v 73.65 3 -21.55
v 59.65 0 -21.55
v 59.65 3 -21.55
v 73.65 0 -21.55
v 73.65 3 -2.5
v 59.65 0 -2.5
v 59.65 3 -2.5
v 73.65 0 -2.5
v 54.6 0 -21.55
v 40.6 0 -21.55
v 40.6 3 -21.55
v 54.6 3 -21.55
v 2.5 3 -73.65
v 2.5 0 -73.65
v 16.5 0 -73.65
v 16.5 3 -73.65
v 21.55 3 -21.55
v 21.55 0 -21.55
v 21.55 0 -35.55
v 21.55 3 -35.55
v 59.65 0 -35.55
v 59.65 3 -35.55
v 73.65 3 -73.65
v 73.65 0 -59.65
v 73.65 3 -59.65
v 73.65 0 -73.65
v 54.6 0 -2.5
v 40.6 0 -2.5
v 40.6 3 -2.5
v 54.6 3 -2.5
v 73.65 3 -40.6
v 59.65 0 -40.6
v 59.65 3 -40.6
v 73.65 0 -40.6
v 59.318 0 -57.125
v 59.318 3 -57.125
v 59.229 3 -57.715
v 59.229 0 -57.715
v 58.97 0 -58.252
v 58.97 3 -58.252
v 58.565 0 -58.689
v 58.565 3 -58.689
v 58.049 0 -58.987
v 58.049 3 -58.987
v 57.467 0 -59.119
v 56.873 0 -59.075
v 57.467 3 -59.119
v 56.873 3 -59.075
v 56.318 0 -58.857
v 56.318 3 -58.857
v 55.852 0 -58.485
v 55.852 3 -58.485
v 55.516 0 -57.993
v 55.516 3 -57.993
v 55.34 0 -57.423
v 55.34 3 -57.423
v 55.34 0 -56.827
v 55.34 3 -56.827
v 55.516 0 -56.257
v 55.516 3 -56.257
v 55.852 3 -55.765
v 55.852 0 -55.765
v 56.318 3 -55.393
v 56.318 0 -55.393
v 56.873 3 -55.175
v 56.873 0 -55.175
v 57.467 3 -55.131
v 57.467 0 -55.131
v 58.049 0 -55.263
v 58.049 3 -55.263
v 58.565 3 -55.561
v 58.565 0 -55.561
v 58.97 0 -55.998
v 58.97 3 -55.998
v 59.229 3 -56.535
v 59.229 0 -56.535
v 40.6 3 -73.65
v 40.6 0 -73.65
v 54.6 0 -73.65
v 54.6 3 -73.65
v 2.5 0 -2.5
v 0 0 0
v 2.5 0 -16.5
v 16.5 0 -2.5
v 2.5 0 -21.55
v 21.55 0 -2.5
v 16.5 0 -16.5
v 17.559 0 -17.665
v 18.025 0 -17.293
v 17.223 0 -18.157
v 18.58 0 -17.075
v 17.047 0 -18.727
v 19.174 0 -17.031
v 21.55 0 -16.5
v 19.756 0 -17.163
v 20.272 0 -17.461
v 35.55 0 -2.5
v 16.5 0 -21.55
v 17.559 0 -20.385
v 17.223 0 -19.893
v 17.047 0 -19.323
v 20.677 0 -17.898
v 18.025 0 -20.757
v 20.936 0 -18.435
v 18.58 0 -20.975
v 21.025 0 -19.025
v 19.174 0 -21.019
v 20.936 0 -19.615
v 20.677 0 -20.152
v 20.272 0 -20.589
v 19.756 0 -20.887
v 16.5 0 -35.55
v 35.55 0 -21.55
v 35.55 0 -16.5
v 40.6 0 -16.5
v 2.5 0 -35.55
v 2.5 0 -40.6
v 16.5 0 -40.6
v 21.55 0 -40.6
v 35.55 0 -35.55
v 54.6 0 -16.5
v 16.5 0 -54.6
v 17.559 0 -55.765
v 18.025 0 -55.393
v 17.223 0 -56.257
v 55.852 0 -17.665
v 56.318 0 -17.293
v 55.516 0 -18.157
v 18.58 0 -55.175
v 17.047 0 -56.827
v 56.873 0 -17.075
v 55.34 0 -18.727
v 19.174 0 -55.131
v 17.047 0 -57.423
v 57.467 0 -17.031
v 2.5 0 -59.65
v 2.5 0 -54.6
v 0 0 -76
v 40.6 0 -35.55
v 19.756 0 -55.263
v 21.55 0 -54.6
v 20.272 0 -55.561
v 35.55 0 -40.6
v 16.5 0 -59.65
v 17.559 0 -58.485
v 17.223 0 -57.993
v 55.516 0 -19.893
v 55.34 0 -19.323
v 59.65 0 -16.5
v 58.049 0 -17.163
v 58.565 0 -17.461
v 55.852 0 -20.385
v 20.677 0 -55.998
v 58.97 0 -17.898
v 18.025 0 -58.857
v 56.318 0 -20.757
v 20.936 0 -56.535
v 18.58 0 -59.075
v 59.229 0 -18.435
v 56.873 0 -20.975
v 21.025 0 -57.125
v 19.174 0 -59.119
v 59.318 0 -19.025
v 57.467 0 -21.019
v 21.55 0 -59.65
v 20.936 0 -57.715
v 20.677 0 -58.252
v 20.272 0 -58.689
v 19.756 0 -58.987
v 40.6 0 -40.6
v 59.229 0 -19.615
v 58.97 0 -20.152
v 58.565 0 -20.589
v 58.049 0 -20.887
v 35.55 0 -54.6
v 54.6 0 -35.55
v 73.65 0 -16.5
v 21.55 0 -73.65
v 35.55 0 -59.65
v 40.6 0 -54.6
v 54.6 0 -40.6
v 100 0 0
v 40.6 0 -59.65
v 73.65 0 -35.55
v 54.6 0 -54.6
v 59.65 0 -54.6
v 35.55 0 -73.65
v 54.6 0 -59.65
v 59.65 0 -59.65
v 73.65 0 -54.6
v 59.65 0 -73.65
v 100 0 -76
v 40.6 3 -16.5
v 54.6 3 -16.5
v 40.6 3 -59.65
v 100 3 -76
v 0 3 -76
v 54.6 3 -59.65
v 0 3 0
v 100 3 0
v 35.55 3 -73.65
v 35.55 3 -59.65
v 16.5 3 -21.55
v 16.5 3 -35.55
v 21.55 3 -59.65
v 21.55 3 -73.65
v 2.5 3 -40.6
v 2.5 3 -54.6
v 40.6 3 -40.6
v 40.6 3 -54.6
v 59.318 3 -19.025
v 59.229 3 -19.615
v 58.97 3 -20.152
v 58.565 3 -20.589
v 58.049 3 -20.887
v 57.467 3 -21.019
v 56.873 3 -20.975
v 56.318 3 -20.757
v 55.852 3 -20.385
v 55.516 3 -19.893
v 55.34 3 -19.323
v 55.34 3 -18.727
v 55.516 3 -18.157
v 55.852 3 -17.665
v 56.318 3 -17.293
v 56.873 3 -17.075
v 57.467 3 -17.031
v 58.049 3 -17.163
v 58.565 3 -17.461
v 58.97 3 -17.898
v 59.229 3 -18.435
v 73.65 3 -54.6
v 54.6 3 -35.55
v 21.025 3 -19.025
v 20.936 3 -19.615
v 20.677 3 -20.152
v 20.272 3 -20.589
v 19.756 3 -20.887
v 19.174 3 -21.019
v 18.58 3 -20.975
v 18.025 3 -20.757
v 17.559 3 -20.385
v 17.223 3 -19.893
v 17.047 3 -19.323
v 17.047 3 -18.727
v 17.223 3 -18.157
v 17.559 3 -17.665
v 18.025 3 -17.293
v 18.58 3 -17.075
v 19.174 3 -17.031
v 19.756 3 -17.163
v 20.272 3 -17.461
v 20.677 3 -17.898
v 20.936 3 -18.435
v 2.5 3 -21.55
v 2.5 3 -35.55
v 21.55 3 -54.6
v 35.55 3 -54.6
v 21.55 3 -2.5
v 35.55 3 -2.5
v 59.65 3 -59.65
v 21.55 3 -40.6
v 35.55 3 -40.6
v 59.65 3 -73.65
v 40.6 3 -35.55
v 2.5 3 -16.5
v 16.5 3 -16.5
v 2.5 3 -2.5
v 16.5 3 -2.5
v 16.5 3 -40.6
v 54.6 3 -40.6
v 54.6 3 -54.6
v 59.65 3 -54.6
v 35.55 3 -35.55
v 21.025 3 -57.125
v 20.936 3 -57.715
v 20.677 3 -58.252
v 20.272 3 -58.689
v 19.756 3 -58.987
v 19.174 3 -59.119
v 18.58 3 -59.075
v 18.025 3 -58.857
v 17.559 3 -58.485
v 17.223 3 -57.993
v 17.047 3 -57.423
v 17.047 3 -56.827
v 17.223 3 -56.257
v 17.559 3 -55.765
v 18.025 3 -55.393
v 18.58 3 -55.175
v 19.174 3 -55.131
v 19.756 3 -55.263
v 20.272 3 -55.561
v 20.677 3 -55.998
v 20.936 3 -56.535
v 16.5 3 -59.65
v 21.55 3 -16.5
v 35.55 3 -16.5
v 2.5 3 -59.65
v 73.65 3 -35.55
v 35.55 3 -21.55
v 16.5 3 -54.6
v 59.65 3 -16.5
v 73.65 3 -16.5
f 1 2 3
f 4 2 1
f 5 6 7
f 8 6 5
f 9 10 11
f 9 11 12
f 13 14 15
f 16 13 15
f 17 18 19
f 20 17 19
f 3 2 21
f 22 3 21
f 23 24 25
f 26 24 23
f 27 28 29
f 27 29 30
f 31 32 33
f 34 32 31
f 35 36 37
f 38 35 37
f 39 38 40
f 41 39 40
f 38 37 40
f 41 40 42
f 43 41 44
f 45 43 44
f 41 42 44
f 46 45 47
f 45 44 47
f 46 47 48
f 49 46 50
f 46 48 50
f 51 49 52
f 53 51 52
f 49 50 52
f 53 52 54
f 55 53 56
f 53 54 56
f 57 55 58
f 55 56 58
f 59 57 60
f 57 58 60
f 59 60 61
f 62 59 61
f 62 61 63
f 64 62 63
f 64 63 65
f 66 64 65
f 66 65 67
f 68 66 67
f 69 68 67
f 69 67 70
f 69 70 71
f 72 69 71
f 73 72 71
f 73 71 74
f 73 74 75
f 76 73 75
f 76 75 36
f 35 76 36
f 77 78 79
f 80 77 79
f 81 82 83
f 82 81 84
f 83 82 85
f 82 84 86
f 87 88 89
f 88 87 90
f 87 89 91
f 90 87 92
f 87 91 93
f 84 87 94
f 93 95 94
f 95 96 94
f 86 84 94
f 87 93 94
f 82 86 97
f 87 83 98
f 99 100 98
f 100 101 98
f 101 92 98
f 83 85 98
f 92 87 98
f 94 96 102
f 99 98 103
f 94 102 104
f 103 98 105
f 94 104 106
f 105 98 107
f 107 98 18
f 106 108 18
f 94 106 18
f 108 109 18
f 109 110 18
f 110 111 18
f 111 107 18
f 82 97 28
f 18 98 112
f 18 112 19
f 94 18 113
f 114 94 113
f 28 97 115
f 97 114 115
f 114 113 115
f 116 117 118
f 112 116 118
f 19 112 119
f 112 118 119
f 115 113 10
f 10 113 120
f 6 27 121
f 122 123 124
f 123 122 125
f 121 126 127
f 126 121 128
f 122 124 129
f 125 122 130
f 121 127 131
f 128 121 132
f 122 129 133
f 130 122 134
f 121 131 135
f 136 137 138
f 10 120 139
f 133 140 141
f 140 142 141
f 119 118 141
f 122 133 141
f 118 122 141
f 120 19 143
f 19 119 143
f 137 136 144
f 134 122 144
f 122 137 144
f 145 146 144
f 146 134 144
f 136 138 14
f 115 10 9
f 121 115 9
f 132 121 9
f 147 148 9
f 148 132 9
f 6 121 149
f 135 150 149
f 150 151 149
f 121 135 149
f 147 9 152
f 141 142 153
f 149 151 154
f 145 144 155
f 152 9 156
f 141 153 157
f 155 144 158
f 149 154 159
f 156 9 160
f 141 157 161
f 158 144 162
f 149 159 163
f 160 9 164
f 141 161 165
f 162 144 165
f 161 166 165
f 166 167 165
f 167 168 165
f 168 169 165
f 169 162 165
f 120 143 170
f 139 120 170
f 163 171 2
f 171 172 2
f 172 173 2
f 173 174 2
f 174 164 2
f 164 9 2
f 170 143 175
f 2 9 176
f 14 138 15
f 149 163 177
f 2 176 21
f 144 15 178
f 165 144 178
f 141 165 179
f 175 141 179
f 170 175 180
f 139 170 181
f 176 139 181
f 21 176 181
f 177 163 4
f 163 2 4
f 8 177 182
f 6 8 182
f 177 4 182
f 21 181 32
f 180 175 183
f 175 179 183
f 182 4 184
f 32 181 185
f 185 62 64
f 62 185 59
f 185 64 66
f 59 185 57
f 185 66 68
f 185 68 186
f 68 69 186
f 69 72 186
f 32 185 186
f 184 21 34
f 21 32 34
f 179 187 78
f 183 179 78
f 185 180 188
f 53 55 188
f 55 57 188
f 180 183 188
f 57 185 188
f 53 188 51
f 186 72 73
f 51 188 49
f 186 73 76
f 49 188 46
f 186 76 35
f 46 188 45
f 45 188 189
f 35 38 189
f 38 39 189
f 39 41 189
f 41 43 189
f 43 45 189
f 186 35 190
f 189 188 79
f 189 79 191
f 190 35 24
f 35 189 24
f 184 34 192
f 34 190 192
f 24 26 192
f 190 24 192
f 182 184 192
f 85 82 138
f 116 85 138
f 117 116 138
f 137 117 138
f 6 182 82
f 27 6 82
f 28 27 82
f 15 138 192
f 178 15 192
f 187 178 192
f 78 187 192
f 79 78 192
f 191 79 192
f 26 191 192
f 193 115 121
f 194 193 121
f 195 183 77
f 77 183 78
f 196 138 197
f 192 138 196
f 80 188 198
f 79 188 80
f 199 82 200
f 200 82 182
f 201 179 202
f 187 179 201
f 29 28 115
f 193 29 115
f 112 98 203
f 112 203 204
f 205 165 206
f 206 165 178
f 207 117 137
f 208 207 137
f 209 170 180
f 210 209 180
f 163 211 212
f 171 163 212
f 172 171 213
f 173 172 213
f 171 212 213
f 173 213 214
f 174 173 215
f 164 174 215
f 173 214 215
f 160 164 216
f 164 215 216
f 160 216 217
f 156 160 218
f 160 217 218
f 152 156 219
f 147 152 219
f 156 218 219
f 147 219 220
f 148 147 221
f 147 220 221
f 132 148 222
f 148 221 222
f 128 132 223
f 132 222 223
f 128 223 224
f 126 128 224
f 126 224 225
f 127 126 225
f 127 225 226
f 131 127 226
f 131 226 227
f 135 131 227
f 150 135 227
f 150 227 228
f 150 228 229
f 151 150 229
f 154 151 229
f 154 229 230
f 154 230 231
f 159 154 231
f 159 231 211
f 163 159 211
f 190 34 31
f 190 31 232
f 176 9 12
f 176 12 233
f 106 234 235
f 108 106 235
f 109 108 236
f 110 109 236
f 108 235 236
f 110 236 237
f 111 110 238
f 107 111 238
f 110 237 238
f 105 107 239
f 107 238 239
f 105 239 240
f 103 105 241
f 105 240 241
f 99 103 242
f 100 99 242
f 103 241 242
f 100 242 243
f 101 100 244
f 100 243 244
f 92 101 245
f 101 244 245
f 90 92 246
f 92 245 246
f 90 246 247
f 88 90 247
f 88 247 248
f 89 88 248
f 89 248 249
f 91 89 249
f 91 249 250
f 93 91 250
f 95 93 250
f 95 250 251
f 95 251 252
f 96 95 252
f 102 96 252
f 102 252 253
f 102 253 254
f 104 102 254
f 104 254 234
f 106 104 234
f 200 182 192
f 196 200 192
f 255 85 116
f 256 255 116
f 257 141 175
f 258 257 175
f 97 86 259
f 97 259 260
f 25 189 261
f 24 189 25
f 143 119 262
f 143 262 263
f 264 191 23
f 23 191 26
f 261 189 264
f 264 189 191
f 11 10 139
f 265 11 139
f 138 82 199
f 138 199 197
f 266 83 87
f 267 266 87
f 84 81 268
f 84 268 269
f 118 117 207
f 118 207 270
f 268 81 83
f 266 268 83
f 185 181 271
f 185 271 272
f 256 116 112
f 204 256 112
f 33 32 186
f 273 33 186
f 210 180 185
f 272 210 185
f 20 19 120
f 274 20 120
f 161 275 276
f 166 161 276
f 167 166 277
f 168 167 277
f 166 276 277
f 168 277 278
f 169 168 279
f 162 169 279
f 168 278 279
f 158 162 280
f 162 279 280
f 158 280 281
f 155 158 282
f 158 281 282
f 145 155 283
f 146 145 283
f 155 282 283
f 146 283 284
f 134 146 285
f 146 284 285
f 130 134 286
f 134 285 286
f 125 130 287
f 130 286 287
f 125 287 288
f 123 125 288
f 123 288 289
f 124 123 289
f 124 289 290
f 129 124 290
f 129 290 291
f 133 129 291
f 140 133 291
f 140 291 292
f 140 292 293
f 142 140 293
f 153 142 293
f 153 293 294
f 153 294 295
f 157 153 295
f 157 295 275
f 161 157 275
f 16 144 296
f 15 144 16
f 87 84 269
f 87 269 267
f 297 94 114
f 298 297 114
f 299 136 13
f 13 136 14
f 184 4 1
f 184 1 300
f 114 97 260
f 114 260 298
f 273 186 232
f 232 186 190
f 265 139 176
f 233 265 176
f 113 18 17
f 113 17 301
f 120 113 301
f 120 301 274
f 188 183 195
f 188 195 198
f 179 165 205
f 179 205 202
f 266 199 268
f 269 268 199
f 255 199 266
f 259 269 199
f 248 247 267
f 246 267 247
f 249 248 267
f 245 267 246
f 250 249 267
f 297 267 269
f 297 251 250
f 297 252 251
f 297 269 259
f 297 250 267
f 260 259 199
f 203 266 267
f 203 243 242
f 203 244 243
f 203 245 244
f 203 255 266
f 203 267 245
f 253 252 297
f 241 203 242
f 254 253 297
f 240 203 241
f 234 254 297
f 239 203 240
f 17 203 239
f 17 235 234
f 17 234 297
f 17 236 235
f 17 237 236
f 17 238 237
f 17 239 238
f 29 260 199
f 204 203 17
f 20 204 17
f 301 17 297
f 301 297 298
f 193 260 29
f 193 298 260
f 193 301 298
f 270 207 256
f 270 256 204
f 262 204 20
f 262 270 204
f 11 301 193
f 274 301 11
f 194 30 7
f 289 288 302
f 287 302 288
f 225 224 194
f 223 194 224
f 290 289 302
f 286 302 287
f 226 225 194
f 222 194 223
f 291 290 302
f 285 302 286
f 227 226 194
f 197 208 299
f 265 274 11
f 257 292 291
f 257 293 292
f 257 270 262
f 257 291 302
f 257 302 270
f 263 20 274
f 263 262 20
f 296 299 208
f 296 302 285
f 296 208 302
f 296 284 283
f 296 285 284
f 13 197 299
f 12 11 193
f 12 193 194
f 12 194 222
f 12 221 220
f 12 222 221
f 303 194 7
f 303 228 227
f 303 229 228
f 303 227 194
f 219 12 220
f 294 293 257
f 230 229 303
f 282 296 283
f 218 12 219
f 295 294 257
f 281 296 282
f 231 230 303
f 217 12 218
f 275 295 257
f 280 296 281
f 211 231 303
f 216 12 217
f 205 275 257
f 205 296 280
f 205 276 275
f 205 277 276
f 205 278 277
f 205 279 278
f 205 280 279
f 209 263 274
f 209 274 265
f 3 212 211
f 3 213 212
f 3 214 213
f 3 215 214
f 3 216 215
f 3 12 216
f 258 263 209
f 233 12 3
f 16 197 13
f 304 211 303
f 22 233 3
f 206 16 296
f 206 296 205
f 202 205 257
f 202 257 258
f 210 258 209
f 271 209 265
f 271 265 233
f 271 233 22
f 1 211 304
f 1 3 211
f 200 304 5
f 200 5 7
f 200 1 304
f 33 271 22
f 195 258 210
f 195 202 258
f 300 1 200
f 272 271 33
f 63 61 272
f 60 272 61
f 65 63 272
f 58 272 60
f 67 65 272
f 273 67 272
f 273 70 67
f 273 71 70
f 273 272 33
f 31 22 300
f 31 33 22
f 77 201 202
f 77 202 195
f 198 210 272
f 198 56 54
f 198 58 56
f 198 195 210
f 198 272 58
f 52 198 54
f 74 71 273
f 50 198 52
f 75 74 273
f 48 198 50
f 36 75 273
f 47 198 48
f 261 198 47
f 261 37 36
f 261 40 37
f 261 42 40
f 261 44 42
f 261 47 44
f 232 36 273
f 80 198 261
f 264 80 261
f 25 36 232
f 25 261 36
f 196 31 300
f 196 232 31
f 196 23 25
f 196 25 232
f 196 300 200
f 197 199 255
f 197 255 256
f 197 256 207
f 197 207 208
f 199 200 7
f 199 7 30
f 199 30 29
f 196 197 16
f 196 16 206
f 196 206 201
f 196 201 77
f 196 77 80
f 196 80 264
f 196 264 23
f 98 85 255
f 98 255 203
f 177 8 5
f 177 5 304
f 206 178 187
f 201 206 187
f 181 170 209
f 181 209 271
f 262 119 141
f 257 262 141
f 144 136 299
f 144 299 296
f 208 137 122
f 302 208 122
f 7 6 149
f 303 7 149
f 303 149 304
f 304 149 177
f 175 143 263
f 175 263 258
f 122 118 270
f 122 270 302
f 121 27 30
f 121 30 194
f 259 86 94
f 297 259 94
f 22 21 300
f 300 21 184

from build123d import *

# Parameters (mm, degrees)
SKETCH1_W               = 100
SKETCH1_H               = 76
BOSS_EXTRUDE1_DEPTH     = 3
CUT_EXTRUDE1_START      = -4
SKETCH2_W               = 14
SKETCH2_H               = 14
CUT_EXTRUDE1_DEPTH      = 5
LPATTERN1_COUNT         = 4
LPATTERN1_PITCH         = 19.05
LPATTERN1_COUNT_DIR2    = 4
LPATTERN1_PITCH_DIR2    = 19.05
SKETCH4_R               = 2
CUT_EXTRUDE2_DEPTH      = 1
CUT_EXTRUDE2_DEPTH_BACK = 4


with BuildPart() as part:
    # Sketch1 → Boss-Extrude1 (new body)
    with BuildSketch(Plane(origin=(0, 0, 0), x_dir=(1, 0, 0), z_dir=(0, 1, 0))):
        with Locations((50, 38)):
            Rectangle(SKETCH1_W, SKETCH1_H)
    extrude(amount=BOSS_EXTRUDE1_DEPTH)

    # Sketch2 → Cut-Extrude1 (cut)
    with BuildSketch(Plane(origin=(0, 3, 0), x_dir=(1, 0, 0), z_dir=(0, 1, 0)).offset(CUT_EXTRUDE1_START)):
        with Locations((9.5, 9.5)):
            Rectangle(SKETCH2_W, SKETCH2_H)
    cut_extrude1 = extrude(amount=CUT_EXTRUDE1_DEPTH, mode=Mode.SUBTRACT)

    # LPattern1: Cut-Extrude1 4 × 4
    with Locations(*[(j * LPATTERN1_PITCH_DIR2, 0, -i * LPATTERN1_PITCH) for i in range(LPATTERN1_COUNT) for j in range(LPATTERN1_COUNT_DIR2) if (i, j) != (0, 0)]):
        add(cut_extrude1, mode=Mode.SUBTRACT)

    # Sketch4 → Cut-Extrude2 (cut, two sides)
    with BuildSketch(Plane(origin=(0, 3, 0), x_dir=(1, 0, 0), z_dir=(0, 1, 0))) as cut_extrude2_sk:
        with Locations((19.025, 57.125)):
            Circle(SKETCH4_R)
        with Locations((57.317897374, 57.125)):
            Circle(SKETCH4_R)
        with Locations((19.025, 19.025)):
            Circle(SKETCH4_R)
        with Locations((57.317897374, 19.025)):
            Circle(SKETCH4_R)
    extrude(amount=CUT_EXTRUDE2_DEPTH, mode=Mode.SUBTRACT)
    extrude(cut_extrude2_sk.sketch, amount=-CUT_EXTRUDE2_DEPTH_BACK, mode=Mode.SUBTRACT)


solid = part.part
